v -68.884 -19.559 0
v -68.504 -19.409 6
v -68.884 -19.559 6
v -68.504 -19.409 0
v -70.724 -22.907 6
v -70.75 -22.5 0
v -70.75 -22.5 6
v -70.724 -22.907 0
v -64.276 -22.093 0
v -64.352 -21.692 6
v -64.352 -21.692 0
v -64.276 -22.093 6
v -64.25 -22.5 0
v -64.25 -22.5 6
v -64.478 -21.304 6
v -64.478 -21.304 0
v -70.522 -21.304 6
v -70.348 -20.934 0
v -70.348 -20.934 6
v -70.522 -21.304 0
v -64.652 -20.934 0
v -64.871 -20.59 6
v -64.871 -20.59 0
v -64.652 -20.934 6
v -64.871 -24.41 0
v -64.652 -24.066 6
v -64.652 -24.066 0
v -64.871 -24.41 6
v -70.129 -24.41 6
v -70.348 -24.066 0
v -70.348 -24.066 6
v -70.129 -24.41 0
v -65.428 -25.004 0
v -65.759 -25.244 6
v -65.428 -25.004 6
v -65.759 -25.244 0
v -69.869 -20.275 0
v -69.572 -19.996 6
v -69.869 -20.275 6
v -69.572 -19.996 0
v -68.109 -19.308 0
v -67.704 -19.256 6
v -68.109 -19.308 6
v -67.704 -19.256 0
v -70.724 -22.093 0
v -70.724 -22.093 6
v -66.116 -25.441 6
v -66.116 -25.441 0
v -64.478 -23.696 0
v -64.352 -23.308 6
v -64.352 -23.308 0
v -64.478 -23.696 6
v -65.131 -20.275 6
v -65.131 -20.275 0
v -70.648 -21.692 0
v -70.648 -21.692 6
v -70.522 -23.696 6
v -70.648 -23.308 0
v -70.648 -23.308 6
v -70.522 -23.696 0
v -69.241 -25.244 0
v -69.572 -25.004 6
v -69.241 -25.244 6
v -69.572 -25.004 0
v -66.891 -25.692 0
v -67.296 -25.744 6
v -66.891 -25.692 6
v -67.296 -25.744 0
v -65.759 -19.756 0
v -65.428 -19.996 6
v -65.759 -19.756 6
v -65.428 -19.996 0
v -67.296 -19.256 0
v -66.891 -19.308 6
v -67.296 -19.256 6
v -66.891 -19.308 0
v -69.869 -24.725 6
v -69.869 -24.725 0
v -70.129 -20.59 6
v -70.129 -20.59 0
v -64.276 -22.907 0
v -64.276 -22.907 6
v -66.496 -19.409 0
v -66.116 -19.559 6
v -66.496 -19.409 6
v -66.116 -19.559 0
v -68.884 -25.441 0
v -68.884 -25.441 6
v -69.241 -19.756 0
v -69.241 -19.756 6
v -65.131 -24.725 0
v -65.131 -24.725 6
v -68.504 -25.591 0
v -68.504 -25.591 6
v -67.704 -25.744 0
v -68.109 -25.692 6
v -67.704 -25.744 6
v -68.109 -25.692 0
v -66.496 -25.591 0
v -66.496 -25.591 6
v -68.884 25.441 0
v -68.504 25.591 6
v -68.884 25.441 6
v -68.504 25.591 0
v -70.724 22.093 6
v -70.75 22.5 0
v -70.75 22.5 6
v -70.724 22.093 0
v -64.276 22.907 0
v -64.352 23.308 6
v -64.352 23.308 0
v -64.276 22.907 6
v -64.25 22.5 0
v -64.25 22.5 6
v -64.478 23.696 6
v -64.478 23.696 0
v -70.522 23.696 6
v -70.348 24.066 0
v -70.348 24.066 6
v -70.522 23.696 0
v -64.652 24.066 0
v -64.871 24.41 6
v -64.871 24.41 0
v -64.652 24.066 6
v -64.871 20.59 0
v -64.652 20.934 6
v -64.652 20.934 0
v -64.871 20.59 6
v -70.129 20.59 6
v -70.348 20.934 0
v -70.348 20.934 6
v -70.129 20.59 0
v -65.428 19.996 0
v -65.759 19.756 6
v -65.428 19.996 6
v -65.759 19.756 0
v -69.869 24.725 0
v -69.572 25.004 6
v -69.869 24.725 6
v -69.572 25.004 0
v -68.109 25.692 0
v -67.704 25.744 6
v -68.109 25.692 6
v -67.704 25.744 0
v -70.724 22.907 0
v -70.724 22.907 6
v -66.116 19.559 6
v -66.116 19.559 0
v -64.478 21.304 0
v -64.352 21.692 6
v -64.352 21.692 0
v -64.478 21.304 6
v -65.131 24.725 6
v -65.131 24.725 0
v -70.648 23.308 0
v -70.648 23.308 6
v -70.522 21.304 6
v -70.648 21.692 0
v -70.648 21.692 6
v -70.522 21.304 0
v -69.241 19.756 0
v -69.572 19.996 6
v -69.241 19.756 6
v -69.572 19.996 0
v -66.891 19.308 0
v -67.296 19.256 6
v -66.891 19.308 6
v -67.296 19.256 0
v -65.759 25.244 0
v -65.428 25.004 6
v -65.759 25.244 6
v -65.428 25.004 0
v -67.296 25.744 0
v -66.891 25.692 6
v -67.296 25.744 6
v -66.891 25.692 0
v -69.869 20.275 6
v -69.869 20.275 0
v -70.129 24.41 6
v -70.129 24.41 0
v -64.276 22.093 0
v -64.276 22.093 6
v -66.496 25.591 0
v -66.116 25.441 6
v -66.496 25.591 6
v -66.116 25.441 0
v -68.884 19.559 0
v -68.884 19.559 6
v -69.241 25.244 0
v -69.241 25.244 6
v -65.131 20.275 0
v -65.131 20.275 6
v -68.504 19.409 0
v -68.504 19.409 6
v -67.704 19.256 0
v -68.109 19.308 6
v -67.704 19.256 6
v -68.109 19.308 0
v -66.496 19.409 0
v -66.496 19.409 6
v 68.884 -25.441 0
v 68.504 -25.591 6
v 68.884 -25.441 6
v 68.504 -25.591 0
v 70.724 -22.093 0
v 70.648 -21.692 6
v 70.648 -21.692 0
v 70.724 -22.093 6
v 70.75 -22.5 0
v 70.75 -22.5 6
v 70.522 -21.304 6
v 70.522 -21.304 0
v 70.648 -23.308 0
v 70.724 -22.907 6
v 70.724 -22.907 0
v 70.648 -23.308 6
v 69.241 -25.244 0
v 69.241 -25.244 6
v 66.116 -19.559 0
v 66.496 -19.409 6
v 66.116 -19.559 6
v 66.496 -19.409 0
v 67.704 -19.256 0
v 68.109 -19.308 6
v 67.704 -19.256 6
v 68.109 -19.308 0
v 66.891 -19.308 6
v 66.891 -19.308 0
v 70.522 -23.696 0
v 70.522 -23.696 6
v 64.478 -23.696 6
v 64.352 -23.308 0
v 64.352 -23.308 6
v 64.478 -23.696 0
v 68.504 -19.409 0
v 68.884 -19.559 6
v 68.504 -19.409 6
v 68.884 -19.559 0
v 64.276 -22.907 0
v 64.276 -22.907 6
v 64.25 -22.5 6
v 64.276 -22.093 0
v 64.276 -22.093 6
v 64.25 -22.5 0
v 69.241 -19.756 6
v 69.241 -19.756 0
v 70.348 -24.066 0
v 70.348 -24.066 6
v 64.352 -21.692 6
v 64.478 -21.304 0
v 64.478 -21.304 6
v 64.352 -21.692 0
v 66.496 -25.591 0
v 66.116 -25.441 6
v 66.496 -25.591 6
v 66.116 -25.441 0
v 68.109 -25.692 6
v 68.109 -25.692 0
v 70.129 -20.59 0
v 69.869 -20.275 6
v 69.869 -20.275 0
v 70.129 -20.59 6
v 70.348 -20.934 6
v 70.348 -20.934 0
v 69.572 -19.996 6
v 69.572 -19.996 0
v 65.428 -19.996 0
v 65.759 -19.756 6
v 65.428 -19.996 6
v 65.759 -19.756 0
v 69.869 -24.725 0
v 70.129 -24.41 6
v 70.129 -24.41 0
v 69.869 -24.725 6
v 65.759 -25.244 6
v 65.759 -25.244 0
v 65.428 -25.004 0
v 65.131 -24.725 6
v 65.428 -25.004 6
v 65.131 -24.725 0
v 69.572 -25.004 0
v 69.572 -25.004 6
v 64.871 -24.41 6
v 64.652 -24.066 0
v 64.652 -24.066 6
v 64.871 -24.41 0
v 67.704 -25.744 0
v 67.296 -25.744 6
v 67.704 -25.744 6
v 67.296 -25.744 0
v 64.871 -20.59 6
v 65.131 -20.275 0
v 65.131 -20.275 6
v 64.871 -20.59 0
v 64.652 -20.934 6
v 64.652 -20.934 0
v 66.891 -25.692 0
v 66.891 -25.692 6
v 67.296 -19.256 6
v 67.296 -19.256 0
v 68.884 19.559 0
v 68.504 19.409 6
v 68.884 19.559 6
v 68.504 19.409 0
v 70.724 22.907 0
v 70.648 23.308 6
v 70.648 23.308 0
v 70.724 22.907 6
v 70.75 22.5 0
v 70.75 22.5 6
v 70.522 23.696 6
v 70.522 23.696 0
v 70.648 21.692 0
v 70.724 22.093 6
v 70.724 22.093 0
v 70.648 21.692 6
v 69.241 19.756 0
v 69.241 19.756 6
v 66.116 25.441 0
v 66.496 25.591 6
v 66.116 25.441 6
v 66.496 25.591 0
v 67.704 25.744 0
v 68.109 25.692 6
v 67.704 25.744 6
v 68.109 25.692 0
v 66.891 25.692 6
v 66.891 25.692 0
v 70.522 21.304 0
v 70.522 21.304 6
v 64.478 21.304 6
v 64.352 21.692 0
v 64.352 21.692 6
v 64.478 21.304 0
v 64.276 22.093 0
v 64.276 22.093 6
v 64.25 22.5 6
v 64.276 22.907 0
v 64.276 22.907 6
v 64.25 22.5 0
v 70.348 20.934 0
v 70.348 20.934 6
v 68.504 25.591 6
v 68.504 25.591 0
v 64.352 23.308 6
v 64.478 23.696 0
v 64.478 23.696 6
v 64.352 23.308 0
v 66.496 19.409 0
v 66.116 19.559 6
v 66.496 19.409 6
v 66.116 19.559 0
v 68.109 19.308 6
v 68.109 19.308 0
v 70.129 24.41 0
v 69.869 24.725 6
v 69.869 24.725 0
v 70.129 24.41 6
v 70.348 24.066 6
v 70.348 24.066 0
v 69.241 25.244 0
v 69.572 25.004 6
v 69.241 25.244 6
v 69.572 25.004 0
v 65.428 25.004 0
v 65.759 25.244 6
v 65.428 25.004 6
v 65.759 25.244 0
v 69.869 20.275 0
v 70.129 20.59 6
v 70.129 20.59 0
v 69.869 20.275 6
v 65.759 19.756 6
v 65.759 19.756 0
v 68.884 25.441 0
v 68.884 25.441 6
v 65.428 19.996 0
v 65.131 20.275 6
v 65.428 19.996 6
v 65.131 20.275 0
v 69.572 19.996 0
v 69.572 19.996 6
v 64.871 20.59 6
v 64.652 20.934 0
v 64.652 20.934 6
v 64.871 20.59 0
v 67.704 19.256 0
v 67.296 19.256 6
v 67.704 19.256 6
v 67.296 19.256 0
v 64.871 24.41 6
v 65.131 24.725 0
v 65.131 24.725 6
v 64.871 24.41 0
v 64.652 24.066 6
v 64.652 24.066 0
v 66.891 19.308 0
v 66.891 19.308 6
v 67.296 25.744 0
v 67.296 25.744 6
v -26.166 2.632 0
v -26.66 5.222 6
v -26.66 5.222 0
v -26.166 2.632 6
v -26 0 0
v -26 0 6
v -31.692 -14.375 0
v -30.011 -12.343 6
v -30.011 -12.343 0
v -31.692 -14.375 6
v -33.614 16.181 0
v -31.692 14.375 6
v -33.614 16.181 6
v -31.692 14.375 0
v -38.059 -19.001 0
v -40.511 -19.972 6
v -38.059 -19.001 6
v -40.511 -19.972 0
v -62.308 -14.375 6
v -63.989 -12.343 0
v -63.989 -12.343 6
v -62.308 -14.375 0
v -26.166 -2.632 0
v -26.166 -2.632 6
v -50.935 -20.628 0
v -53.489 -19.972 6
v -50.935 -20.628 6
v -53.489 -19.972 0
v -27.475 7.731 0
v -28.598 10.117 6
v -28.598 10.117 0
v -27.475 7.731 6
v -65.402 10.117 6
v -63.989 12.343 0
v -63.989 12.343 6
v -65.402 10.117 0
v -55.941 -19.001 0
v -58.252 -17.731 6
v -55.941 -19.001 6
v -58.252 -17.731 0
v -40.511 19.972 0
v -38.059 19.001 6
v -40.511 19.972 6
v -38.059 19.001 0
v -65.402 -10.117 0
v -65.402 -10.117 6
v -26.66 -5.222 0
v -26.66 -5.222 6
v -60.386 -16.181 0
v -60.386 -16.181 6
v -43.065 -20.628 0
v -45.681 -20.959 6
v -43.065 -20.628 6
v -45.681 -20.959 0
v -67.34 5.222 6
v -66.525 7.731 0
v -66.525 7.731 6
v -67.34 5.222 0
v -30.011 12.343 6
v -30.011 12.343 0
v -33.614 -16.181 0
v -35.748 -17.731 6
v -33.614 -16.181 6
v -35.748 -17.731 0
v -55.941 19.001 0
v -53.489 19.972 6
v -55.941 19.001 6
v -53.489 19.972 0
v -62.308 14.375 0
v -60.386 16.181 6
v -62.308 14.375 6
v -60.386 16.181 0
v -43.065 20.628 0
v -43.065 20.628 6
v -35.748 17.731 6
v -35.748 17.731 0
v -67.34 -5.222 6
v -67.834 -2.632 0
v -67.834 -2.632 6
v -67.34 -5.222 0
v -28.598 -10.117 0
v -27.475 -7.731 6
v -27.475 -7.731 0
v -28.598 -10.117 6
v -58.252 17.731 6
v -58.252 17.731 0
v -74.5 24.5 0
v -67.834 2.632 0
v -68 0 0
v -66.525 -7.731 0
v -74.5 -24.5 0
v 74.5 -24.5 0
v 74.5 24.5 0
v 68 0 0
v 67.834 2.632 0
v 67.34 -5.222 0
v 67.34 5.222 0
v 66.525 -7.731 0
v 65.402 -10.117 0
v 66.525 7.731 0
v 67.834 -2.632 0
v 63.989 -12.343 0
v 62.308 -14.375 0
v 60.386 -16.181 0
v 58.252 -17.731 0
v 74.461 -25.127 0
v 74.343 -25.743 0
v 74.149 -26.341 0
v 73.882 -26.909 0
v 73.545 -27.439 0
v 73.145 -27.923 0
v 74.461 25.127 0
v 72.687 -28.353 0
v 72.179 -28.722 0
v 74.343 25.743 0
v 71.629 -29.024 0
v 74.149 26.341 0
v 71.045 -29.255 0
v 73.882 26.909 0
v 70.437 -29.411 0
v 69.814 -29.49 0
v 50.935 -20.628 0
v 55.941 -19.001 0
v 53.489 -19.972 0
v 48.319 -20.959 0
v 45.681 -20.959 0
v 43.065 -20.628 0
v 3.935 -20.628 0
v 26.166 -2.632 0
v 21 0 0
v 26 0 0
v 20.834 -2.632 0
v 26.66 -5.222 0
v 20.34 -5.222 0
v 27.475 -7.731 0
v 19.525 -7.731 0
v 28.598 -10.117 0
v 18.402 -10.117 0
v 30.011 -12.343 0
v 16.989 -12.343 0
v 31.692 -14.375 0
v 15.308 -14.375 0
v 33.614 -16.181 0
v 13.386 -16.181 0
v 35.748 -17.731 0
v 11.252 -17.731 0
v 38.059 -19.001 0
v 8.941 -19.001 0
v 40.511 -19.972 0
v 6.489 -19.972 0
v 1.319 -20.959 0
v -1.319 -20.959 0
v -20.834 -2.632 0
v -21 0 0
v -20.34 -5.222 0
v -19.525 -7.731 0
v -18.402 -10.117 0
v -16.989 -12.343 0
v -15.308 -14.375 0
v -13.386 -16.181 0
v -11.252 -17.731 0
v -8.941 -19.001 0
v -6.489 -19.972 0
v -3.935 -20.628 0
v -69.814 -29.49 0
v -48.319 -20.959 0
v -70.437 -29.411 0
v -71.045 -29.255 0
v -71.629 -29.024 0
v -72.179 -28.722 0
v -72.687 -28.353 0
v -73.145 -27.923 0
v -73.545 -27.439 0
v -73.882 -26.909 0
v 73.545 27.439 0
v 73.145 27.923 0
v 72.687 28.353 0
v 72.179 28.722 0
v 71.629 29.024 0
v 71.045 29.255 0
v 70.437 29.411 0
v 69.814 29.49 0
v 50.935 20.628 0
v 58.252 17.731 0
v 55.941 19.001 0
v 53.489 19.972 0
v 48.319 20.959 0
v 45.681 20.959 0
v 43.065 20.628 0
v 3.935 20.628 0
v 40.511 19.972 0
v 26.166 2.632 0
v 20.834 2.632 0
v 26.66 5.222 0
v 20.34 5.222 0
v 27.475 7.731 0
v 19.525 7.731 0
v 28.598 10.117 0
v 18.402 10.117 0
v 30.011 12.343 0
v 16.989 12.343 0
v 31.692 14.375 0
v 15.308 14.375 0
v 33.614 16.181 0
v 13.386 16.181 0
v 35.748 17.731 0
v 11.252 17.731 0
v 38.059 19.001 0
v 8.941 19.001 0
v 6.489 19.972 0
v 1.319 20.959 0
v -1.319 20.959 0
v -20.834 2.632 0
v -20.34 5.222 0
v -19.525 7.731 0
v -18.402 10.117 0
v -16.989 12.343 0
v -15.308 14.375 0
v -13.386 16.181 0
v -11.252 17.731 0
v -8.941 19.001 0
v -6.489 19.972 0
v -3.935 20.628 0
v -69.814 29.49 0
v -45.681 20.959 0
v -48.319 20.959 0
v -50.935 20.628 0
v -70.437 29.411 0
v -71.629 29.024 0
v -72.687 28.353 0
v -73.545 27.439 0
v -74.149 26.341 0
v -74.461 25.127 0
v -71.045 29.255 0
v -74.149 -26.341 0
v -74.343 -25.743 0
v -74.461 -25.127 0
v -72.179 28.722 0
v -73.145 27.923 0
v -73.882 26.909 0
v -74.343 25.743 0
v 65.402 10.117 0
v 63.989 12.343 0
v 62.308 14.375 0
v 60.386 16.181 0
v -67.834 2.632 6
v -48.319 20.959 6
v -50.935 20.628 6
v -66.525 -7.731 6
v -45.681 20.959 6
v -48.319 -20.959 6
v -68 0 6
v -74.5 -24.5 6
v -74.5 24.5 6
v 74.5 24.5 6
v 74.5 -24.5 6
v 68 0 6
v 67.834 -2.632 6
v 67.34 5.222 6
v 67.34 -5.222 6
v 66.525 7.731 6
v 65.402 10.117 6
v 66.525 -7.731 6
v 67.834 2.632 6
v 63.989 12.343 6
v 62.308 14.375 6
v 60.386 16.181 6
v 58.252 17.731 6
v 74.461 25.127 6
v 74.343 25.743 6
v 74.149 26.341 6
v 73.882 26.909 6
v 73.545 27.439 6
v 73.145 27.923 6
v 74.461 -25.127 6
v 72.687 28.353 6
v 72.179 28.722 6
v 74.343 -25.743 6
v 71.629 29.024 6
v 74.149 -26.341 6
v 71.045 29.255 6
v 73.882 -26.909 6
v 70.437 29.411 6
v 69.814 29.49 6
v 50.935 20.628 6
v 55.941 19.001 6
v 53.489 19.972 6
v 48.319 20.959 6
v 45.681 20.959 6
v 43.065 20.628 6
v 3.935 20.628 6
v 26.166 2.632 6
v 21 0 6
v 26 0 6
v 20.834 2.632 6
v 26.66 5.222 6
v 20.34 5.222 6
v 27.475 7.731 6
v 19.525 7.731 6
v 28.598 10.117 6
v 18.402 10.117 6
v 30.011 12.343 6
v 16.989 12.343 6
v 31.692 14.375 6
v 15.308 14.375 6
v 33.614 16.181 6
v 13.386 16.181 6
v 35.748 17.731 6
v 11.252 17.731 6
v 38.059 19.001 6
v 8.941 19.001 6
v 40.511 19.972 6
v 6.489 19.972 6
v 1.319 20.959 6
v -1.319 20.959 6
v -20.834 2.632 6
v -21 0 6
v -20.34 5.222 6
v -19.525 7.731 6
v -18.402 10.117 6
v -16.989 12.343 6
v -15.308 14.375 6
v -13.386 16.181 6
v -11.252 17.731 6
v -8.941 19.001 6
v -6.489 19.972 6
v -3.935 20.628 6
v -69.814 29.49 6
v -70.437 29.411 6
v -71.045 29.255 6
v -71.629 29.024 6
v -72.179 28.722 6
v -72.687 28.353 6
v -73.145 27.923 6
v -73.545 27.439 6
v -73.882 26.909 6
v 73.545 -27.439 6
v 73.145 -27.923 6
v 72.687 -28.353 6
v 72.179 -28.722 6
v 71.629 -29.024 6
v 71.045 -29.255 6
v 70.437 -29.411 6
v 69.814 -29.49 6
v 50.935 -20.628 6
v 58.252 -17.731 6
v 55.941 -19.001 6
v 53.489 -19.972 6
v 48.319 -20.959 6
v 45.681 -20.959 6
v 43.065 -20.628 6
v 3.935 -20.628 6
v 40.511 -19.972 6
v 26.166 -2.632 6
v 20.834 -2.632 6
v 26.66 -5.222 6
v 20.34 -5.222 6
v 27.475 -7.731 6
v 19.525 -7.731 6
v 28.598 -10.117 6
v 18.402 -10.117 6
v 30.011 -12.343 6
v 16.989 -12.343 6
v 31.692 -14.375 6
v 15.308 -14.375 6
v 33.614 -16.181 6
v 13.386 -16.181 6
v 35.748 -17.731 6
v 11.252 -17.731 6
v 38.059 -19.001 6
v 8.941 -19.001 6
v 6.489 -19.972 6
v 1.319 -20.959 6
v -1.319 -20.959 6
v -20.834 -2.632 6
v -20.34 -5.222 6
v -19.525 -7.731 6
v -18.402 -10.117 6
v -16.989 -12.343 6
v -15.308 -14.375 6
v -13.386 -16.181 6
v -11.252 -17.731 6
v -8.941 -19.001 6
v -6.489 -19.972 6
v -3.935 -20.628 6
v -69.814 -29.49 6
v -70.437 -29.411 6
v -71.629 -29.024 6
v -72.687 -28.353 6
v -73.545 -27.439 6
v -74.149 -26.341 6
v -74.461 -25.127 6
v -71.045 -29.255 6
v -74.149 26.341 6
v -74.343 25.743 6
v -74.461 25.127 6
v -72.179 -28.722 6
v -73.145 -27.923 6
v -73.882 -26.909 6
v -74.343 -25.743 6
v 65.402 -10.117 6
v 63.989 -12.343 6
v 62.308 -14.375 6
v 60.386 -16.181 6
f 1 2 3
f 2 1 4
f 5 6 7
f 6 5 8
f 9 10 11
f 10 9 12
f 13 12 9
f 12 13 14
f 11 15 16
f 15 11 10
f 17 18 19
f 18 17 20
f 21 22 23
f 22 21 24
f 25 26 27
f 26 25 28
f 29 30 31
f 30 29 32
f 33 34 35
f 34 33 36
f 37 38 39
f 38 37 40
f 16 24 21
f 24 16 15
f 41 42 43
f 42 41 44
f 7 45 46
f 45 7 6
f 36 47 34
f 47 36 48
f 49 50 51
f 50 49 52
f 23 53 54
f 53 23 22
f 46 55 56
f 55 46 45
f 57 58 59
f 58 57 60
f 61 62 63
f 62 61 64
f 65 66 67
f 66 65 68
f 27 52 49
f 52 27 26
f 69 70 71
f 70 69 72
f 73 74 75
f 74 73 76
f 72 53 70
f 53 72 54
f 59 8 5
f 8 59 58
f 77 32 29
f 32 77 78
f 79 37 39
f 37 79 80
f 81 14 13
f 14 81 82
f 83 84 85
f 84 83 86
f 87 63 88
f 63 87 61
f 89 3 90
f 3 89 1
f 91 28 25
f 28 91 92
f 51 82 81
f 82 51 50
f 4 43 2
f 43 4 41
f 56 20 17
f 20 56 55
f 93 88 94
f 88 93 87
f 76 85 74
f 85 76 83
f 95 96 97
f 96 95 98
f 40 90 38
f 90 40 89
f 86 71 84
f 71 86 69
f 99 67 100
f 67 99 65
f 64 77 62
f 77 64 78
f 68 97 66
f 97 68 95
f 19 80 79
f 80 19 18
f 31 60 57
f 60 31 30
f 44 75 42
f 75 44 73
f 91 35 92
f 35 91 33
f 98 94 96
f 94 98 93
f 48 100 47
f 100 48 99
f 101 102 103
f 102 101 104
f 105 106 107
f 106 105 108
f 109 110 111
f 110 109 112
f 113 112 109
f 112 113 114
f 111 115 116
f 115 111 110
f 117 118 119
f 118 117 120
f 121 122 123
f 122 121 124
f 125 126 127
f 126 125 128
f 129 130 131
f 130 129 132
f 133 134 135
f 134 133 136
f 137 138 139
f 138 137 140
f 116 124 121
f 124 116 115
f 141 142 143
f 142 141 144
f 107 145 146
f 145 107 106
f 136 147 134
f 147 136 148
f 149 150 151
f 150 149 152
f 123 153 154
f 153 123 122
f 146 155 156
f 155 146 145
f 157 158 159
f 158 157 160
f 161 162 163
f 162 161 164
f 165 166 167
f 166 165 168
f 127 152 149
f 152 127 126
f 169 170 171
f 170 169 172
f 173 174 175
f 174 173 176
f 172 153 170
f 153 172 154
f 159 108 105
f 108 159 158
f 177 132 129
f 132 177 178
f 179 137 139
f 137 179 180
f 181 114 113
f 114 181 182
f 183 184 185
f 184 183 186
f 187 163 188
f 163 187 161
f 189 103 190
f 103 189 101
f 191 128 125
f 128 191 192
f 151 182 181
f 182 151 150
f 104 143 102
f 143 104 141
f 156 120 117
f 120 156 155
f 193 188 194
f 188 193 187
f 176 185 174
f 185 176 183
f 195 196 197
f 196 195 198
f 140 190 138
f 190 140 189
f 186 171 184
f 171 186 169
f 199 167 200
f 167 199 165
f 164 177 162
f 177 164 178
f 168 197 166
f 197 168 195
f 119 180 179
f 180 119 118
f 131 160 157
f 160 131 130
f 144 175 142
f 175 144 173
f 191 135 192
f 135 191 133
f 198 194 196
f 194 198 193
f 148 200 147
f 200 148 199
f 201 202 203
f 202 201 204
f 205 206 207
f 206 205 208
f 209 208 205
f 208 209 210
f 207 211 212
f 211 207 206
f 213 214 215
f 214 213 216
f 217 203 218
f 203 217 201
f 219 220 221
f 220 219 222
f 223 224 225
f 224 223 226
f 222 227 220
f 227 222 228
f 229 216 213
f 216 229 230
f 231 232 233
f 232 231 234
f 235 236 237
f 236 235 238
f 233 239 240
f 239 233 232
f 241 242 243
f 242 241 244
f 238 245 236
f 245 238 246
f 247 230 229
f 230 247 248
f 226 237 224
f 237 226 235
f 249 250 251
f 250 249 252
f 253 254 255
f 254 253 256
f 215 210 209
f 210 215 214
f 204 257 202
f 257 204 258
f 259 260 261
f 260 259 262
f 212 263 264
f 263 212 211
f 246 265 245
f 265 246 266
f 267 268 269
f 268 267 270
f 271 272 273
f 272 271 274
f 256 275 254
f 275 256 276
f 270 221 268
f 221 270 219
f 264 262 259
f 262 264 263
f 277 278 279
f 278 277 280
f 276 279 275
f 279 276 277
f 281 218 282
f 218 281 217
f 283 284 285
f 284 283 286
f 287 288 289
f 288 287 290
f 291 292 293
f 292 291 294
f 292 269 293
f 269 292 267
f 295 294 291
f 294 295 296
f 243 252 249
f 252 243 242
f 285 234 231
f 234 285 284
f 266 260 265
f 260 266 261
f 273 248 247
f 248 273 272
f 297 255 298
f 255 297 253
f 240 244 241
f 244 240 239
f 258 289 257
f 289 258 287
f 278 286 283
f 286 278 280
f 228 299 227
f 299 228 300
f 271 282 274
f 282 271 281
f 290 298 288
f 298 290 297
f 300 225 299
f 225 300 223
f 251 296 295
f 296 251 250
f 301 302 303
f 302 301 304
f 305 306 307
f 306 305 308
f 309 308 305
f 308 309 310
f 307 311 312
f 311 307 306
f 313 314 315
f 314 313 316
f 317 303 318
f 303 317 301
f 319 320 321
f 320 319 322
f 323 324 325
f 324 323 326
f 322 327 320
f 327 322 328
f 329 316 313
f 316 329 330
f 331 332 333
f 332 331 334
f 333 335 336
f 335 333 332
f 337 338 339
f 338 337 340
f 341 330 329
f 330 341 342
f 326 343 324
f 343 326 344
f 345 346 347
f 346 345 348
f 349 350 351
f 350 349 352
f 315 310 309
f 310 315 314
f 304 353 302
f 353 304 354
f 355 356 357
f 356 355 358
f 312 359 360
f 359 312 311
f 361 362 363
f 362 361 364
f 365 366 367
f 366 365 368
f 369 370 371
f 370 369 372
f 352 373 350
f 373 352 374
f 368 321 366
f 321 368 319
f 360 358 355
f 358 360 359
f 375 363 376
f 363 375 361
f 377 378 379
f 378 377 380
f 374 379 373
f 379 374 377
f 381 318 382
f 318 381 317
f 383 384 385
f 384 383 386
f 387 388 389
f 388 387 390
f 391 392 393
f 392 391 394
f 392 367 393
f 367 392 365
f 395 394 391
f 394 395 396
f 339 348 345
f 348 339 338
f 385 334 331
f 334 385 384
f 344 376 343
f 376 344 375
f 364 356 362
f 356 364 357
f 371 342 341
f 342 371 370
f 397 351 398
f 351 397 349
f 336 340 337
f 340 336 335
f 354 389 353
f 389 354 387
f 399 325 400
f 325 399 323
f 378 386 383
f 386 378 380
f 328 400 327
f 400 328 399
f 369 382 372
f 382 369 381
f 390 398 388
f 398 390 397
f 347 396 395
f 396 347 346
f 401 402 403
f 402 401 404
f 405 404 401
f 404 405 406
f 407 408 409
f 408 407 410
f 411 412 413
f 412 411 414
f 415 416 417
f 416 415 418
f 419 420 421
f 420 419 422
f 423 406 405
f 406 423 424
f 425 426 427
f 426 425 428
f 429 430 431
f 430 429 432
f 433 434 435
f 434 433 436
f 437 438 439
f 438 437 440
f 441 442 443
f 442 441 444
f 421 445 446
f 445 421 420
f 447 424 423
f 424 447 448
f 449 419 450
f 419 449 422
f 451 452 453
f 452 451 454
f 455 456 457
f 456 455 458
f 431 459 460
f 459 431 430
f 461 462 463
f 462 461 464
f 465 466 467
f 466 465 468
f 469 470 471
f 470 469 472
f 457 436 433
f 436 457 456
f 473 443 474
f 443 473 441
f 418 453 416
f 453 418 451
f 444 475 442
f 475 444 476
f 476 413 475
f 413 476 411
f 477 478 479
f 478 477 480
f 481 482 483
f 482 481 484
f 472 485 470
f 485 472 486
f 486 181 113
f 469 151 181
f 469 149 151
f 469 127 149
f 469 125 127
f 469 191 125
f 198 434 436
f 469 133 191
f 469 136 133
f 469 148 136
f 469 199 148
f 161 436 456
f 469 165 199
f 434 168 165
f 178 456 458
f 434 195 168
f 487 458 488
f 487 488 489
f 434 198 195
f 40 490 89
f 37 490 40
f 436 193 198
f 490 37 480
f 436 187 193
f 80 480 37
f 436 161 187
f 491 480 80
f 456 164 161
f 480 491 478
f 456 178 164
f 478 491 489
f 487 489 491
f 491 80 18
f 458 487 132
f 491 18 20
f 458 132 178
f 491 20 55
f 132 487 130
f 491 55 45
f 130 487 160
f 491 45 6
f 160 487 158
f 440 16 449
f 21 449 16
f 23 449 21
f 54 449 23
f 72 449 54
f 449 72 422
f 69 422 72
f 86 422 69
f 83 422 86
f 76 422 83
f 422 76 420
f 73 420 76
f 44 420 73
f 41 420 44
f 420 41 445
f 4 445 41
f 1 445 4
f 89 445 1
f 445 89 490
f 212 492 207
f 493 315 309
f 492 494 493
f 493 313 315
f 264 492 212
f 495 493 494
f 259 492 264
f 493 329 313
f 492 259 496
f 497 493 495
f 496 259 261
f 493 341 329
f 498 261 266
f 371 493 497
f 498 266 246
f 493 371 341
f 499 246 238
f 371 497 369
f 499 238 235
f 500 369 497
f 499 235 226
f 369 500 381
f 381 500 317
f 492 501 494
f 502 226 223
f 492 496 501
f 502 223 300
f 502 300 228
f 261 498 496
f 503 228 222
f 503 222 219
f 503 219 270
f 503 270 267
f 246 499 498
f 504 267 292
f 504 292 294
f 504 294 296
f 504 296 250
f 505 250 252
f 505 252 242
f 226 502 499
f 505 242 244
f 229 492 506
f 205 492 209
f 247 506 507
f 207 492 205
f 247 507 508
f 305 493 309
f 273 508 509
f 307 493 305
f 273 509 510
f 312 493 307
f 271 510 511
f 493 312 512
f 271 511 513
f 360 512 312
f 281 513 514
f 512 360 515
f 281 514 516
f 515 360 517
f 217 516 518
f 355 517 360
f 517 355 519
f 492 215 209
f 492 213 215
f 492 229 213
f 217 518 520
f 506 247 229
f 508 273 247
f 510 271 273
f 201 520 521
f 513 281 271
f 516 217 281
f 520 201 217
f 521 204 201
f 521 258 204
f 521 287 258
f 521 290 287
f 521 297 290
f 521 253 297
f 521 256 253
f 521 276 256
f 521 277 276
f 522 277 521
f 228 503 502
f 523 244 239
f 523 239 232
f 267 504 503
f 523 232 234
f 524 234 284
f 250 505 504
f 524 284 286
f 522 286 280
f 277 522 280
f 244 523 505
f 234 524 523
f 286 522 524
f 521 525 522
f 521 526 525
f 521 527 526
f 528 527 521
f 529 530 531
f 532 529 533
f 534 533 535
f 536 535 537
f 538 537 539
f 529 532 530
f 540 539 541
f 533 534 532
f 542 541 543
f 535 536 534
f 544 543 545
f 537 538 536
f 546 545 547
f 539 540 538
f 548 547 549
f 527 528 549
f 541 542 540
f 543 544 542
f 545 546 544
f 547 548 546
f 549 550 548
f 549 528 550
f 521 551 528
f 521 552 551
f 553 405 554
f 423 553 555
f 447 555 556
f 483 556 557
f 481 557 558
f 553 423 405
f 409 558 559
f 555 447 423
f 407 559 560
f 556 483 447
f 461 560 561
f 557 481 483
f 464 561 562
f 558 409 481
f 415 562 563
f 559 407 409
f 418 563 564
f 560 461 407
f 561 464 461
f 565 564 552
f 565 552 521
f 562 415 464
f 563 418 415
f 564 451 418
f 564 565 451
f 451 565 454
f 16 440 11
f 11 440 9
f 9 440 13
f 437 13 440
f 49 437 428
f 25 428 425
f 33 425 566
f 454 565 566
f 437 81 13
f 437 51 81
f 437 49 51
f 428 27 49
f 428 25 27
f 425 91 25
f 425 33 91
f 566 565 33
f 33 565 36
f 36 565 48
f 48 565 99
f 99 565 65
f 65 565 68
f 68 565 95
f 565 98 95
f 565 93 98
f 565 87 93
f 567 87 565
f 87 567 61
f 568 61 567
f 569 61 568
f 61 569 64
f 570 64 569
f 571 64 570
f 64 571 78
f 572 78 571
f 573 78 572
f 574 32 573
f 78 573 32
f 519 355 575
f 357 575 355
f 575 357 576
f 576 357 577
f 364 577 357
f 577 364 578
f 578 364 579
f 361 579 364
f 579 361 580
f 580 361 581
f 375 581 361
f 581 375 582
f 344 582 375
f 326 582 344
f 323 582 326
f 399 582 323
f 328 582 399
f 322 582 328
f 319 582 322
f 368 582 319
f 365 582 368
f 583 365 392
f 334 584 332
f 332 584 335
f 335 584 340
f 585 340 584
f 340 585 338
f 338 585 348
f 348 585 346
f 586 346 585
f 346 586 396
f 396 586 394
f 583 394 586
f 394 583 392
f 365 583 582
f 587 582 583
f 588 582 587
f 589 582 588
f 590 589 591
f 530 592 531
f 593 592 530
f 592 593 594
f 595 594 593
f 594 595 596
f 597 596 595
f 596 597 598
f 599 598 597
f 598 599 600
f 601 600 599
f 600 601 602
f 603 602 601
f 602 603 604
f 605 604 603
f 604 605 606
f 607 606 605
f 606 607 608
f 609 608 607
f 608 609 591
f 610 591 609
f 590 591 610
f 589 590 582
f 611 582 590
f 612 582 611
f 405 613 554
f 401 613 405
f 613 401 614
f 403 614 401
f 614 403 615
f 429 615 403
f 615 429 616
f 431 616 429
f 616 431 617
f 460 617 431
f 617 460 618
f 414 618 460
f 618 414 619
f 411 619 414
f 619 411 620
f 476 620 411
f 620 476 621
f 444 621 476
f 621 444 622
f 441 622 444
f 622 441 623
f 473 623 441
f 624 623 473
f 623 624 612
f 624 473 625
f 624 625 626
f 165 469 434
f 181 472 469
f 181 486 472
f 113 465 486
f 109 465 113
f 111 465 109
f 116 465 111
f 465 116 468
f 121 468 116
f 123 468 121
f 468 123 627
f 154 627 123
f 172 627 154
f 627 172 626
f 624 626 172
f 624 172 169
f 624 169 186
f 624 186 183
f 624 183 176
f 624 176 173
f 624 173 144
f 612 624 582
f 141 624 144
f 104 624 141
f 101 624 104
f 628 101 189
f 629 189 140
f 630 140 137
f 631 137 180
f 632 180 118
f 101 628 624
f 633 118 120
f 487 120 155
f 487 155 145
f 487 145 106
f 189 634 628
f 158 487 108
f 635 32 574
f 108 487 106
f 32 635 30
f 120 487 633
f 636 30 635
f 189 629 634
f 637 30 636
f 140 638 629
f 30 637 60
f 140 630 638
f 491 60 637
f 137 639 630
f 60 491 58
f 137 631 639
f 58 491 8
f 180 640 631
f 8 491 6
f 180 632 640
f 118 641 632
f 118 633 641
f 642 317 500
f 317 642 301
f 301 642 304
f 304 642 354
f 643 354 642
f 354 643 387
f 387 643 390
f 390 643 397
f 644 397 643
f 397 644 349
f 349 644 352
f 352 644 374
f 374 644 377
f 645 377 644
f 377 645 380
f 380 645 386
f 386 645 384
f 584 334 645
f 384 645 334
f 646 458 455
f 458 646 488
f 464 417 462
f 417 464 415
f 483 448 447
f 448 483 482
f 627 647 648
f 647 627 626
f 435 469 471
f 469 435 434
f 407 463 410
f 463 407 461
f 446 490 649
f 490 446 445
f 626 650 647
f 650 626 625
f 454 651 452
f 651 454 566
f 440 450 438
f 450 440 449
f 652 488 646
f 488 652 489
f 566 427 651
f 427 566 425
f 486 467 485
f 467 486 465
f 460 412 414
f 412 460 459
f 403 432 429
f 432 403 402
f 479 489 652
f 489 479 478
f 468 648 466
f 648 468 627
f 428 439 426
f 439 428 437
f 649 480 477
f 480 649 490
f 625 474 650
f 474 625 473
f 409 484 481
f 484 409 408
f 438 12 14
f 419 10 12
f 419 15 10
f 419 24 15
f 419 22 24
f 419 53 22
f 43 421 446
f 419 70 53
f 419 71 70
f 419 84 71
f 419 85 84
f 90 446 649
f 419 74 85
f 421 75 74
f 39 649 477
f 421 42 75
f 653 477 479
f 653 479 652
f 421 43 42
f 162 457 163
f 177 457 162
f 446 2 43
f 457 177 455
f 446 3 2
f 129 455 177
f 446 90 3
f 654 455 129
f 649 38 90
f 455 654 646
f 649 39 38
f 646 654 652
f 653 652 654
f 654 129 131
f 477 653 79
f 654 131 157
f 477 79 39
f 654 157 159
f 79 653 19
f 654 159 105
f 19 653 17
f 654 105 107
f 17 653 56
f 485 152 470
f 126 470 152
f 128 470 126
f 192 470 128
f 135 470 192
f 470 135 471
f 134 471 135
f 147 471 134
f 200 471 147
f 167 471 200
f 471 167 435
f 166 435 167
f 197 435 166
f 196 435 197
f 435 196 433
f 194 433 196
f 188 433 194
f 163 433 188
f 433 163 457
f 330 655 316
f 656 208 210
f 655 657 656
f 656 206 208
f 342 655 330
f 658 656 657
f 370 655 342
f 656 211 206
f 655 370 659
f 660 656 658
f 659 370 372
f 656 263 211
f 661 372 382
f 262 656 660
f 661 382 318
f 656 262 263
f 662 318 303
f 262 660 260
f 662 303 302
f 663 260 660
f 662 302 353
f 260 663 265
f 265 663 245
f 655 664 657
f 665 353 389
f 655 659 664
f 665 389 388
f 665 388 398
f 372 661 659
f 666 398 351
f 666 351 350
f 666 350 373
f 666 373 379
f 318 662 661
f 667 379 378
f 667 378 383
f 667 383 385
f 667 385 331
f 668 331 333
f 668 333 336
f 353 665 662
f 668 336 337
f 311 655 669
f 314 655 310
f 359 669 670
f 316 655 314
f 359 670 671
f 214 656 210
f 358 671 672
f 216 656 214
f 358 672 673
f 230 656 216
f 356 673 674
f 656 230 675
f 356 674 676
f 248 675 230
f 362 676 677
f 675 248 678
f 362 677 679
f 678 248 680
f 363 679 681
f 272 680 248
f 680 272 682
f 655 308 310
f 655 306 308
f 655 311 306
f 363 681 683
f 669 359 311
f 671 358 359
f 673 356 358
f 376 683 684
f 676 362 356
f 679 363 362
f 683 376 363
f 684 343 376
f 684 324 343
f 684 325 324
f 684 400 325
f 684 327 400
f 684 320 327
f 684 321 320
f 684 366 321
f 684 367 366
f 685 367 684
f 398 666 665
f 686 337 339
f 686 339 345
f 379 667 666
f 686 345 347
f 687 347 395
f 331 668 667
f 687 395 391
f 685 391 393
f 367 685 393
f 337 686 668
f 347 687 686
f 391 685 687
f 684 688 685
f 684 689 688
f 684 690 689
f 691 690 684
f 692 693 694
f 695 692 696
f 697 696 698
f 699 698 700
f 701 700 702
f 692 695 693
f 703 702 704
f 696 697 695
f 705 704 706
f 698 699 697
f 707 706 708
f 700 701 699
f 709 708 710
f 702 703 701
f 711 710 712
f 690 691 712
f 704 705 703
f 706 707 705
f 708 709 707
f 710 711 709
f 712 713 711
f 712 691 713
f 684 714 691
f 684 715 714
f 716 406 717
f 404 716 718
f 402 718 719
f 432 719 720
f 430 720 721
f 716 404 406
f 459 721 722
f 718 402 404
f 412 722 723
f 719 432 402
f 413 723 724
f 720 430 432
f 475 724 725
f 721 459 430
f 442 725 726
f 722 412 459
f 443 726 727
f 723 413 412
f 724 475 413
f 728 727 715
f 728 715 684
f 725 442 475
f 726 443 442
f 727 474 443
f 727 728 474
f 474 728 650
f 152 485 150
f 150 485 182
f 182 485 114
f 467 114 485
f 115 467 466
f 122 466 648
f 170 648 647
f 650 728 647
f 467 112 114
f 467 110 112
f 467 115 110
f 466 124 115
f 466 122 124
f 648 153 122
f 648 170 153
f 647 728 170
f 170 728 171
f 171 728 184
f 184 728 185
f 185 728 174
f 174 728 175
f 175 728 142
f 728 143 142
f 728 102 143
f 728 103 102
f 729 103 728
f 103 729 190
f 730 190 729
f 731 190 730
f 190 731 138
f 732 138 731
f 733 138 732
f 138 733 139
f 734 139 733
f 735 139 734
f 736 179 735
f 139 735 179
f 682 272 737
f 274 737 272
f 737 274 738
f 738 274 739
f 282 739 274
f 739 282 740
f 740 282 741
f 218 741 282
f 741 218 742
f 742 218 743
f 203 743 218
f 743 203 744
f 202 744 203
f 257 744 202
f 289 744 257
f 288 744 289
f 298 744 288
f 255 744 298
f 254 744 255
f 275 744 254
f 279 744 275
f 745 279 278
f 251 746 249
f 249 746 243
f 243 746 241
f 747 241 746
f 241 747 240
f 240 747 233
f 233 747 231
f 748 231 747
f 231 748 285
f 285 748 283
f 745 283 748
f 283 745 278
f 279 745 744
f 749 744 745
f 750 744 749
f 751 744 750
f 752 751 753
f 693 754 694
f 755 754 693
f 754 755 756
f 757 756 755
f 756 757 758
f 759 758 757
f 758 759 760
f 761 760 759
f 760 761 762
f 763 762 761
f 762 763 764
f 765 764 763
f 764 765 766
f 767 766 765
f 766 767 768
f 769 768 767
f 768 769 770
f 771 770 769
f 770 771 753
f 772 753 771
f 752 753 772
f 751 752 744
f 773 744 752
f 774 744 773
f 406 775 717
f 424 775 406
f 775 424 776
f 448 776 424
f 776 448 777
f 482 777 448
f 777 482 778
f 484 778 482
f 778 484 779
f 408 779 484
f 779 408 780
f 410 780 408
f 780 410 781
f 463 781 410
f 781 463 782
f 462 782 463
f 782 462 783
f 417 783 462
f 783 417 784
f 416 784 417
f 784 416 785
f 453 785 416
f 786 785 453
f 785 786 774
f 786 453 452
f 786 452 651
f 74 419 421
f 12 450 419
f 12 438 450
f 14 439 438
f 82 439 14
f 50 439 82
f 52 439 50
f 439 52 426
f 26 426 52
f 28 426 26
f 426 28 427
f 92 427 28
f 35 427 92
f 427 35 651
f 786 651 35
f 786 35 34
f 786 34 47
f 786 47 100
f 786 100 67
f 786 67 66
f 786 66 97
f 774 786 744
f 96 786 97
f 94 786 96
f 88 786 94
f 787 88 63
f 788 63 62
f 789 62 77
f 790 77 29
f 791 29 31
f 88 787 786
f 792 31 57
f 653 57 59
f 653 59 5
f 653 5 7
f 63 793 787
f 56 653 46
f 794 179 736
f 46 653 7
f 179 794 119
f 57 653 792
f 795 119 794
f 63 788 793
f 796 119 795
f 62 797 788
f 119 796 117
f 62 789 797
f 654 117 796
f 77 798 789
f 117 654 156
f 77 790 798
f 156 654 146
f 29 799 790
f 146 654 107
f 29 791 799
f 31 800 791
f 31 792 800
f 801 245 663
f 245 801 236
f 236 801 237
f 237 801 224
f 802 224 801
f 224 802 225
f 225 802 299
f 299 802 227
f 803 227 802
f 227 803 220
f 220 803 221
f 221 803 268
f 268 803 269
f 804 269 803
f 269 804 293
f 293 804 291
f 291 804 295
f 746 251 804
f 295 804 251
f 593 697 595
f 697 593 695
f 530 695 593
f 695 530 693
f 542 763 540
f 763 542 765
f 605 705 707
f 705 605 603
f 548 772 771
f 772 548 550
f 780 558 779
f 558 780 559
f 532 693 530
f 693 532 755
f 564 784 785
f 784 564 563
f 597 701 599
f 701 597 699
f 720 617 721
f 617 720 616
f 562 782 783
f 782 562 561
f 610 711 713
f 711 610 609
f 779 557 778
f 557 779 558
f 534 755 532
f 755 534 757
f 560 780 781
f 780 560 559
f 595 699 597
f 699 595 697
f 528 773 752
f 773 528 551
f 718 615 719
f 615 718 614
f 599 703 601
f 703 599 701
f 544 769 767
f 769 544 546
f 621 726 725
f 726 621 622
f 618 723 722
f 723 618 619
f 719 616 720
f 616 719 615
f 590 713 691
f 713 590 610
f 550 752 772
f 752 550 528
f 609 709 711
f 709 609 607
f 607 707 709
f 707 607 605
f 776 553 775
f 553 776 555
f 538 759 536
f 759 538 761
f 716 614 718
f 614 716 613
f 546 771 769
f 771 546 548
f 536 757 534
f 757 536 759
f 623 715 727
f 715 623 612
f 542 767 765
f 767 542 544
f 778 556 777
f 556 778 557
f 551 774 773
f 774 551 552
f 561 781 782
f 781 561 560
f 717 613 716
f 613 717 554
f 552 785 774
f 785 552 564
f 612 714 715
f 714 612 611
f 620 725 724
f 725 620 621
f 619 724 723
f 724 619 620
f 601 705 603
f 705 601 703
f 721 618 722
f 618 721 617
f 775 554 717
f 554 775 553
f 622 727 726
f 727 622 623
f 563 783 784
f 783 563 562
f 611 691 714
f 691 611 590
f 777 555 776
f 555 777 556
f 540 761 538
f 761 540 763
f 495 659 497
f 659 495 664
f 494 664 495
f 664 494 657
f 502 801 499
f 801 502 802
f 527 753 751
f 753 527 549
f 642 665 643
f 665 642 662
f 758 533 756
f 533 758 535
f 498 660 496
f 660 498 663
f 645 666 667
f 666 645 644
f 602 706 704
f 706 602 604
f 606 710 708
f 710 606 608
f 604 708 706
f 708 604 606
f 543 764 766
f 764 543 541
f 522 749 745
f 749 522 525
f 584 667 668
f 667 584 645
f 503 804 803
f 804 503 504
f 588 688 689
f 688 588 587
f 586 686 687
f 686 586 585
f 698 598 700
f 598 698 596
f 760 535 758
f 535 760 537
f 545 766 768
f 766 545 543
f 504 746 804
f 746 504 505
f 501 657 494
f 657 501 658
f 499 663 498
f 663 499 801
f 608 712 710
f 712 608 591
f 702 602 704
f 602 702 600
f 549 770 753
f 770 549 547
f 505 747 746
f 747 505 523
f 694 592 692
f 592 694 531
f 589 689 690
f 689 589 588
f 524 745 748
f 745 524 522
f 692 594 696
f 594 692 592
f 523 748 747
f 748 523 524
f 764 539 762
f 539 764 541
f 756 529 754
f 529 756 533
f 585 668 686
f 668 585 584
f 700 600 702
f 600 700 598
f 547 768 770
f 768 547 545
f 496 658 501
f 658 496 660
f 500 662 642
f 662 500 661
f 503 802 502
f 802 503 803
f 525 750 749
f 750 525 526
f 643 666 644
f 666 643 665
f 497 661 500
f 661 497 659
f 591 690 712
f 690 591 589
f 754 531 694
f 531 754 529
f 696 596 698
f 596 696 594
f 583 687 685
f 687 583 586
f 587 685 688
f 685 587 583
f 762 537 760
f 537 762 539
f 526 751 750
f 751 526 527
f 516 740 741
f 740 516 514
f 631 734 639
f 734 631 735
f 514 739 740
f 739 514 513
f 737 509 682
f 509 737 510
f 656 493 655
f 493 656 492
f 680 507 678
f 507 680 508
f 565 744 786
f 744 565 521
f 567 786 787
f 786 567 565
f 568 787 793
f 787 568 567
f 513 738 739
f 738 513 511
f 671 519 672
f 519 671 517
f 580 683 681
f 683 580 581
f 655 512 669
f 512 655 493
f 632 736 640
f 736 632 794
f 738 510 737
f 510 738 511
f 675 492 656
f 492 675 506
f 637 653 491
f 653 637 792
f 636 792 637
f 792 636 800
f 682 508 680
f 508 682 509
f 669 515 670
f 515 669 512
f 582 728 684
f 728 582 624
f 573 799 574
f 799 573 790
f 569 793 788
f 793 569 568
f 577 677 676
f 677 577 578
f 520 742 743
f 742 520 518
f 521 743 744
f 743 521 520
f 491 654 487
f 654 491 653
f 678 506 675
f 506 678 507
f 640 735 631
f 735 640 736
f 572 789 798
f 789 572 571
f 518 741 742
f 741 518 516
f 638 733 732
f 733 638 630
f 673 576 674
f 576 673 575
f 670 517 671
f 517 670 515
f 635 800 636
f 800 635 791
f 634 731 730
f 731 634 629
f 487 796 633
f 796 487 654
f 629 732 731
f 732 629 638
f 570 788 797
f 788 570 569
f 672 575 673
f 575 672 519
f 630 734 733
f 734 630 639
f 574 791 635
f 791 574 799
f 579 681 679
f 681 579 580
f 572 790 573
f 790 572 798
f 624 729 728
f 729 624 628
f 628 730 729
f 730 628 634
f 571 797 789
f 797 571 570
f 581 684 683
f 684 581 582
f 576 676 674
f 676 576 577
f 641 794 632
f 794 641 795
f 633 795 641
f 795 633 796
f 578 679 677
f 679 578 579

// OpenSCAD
$fn = 50;


difference() {
	union() {
		hull() {
			translate(v = [-69.5000000000, 24.5000000000, 0]) {
				cylinder(h = 6, r = 5);
			}
			translate(v = [69.5000000000, 24.5000000000, 0]) {
				cylinder(h = 6, r = 5);
			}
			translate(v = [-69.5000000000, -24.5000000000, 0]) {
				cylinder(h = 6, r = 5);
			}
			translate(v = [69.5000000000, -24.5000000000, 0]) {
				cylinder(h = 6, r = 5);
			}
		}
	}
	union() {
		#translate(v = [-67.5000000000, -22.5000000000, -100.0000000000]) {
			cylinder(h = 200, r = 3.2500000000);
		}
		#translate(v = [-67.5000000000, 22.5000000000, -100.0000000000]) {
			cylinder(h = 200, r = 3.2500000000);
		}
		#translate(v = [67.5000000000, -22.5000000000, -100.0000000000]) {
			cylinder(h = 200, r = 3.2500000000);
		}
		#translate(v = [67.5000000000, 22.5000000000, -100.0000000000]) {
			cylinder(h = 200, r = 3.2500000000);
		}
		#translate(v = [-47.0000000000, 0, 0]) {
			cylinder(h = 6, r = 21.0000000000);
		}
		#cylinder(h = 6, r = 21.0000000000);
		#translate(v = [47.0000000000, 0, 0]) {
			cylinder(h = 6, r = 21.0000000000);
		}
	}
}
